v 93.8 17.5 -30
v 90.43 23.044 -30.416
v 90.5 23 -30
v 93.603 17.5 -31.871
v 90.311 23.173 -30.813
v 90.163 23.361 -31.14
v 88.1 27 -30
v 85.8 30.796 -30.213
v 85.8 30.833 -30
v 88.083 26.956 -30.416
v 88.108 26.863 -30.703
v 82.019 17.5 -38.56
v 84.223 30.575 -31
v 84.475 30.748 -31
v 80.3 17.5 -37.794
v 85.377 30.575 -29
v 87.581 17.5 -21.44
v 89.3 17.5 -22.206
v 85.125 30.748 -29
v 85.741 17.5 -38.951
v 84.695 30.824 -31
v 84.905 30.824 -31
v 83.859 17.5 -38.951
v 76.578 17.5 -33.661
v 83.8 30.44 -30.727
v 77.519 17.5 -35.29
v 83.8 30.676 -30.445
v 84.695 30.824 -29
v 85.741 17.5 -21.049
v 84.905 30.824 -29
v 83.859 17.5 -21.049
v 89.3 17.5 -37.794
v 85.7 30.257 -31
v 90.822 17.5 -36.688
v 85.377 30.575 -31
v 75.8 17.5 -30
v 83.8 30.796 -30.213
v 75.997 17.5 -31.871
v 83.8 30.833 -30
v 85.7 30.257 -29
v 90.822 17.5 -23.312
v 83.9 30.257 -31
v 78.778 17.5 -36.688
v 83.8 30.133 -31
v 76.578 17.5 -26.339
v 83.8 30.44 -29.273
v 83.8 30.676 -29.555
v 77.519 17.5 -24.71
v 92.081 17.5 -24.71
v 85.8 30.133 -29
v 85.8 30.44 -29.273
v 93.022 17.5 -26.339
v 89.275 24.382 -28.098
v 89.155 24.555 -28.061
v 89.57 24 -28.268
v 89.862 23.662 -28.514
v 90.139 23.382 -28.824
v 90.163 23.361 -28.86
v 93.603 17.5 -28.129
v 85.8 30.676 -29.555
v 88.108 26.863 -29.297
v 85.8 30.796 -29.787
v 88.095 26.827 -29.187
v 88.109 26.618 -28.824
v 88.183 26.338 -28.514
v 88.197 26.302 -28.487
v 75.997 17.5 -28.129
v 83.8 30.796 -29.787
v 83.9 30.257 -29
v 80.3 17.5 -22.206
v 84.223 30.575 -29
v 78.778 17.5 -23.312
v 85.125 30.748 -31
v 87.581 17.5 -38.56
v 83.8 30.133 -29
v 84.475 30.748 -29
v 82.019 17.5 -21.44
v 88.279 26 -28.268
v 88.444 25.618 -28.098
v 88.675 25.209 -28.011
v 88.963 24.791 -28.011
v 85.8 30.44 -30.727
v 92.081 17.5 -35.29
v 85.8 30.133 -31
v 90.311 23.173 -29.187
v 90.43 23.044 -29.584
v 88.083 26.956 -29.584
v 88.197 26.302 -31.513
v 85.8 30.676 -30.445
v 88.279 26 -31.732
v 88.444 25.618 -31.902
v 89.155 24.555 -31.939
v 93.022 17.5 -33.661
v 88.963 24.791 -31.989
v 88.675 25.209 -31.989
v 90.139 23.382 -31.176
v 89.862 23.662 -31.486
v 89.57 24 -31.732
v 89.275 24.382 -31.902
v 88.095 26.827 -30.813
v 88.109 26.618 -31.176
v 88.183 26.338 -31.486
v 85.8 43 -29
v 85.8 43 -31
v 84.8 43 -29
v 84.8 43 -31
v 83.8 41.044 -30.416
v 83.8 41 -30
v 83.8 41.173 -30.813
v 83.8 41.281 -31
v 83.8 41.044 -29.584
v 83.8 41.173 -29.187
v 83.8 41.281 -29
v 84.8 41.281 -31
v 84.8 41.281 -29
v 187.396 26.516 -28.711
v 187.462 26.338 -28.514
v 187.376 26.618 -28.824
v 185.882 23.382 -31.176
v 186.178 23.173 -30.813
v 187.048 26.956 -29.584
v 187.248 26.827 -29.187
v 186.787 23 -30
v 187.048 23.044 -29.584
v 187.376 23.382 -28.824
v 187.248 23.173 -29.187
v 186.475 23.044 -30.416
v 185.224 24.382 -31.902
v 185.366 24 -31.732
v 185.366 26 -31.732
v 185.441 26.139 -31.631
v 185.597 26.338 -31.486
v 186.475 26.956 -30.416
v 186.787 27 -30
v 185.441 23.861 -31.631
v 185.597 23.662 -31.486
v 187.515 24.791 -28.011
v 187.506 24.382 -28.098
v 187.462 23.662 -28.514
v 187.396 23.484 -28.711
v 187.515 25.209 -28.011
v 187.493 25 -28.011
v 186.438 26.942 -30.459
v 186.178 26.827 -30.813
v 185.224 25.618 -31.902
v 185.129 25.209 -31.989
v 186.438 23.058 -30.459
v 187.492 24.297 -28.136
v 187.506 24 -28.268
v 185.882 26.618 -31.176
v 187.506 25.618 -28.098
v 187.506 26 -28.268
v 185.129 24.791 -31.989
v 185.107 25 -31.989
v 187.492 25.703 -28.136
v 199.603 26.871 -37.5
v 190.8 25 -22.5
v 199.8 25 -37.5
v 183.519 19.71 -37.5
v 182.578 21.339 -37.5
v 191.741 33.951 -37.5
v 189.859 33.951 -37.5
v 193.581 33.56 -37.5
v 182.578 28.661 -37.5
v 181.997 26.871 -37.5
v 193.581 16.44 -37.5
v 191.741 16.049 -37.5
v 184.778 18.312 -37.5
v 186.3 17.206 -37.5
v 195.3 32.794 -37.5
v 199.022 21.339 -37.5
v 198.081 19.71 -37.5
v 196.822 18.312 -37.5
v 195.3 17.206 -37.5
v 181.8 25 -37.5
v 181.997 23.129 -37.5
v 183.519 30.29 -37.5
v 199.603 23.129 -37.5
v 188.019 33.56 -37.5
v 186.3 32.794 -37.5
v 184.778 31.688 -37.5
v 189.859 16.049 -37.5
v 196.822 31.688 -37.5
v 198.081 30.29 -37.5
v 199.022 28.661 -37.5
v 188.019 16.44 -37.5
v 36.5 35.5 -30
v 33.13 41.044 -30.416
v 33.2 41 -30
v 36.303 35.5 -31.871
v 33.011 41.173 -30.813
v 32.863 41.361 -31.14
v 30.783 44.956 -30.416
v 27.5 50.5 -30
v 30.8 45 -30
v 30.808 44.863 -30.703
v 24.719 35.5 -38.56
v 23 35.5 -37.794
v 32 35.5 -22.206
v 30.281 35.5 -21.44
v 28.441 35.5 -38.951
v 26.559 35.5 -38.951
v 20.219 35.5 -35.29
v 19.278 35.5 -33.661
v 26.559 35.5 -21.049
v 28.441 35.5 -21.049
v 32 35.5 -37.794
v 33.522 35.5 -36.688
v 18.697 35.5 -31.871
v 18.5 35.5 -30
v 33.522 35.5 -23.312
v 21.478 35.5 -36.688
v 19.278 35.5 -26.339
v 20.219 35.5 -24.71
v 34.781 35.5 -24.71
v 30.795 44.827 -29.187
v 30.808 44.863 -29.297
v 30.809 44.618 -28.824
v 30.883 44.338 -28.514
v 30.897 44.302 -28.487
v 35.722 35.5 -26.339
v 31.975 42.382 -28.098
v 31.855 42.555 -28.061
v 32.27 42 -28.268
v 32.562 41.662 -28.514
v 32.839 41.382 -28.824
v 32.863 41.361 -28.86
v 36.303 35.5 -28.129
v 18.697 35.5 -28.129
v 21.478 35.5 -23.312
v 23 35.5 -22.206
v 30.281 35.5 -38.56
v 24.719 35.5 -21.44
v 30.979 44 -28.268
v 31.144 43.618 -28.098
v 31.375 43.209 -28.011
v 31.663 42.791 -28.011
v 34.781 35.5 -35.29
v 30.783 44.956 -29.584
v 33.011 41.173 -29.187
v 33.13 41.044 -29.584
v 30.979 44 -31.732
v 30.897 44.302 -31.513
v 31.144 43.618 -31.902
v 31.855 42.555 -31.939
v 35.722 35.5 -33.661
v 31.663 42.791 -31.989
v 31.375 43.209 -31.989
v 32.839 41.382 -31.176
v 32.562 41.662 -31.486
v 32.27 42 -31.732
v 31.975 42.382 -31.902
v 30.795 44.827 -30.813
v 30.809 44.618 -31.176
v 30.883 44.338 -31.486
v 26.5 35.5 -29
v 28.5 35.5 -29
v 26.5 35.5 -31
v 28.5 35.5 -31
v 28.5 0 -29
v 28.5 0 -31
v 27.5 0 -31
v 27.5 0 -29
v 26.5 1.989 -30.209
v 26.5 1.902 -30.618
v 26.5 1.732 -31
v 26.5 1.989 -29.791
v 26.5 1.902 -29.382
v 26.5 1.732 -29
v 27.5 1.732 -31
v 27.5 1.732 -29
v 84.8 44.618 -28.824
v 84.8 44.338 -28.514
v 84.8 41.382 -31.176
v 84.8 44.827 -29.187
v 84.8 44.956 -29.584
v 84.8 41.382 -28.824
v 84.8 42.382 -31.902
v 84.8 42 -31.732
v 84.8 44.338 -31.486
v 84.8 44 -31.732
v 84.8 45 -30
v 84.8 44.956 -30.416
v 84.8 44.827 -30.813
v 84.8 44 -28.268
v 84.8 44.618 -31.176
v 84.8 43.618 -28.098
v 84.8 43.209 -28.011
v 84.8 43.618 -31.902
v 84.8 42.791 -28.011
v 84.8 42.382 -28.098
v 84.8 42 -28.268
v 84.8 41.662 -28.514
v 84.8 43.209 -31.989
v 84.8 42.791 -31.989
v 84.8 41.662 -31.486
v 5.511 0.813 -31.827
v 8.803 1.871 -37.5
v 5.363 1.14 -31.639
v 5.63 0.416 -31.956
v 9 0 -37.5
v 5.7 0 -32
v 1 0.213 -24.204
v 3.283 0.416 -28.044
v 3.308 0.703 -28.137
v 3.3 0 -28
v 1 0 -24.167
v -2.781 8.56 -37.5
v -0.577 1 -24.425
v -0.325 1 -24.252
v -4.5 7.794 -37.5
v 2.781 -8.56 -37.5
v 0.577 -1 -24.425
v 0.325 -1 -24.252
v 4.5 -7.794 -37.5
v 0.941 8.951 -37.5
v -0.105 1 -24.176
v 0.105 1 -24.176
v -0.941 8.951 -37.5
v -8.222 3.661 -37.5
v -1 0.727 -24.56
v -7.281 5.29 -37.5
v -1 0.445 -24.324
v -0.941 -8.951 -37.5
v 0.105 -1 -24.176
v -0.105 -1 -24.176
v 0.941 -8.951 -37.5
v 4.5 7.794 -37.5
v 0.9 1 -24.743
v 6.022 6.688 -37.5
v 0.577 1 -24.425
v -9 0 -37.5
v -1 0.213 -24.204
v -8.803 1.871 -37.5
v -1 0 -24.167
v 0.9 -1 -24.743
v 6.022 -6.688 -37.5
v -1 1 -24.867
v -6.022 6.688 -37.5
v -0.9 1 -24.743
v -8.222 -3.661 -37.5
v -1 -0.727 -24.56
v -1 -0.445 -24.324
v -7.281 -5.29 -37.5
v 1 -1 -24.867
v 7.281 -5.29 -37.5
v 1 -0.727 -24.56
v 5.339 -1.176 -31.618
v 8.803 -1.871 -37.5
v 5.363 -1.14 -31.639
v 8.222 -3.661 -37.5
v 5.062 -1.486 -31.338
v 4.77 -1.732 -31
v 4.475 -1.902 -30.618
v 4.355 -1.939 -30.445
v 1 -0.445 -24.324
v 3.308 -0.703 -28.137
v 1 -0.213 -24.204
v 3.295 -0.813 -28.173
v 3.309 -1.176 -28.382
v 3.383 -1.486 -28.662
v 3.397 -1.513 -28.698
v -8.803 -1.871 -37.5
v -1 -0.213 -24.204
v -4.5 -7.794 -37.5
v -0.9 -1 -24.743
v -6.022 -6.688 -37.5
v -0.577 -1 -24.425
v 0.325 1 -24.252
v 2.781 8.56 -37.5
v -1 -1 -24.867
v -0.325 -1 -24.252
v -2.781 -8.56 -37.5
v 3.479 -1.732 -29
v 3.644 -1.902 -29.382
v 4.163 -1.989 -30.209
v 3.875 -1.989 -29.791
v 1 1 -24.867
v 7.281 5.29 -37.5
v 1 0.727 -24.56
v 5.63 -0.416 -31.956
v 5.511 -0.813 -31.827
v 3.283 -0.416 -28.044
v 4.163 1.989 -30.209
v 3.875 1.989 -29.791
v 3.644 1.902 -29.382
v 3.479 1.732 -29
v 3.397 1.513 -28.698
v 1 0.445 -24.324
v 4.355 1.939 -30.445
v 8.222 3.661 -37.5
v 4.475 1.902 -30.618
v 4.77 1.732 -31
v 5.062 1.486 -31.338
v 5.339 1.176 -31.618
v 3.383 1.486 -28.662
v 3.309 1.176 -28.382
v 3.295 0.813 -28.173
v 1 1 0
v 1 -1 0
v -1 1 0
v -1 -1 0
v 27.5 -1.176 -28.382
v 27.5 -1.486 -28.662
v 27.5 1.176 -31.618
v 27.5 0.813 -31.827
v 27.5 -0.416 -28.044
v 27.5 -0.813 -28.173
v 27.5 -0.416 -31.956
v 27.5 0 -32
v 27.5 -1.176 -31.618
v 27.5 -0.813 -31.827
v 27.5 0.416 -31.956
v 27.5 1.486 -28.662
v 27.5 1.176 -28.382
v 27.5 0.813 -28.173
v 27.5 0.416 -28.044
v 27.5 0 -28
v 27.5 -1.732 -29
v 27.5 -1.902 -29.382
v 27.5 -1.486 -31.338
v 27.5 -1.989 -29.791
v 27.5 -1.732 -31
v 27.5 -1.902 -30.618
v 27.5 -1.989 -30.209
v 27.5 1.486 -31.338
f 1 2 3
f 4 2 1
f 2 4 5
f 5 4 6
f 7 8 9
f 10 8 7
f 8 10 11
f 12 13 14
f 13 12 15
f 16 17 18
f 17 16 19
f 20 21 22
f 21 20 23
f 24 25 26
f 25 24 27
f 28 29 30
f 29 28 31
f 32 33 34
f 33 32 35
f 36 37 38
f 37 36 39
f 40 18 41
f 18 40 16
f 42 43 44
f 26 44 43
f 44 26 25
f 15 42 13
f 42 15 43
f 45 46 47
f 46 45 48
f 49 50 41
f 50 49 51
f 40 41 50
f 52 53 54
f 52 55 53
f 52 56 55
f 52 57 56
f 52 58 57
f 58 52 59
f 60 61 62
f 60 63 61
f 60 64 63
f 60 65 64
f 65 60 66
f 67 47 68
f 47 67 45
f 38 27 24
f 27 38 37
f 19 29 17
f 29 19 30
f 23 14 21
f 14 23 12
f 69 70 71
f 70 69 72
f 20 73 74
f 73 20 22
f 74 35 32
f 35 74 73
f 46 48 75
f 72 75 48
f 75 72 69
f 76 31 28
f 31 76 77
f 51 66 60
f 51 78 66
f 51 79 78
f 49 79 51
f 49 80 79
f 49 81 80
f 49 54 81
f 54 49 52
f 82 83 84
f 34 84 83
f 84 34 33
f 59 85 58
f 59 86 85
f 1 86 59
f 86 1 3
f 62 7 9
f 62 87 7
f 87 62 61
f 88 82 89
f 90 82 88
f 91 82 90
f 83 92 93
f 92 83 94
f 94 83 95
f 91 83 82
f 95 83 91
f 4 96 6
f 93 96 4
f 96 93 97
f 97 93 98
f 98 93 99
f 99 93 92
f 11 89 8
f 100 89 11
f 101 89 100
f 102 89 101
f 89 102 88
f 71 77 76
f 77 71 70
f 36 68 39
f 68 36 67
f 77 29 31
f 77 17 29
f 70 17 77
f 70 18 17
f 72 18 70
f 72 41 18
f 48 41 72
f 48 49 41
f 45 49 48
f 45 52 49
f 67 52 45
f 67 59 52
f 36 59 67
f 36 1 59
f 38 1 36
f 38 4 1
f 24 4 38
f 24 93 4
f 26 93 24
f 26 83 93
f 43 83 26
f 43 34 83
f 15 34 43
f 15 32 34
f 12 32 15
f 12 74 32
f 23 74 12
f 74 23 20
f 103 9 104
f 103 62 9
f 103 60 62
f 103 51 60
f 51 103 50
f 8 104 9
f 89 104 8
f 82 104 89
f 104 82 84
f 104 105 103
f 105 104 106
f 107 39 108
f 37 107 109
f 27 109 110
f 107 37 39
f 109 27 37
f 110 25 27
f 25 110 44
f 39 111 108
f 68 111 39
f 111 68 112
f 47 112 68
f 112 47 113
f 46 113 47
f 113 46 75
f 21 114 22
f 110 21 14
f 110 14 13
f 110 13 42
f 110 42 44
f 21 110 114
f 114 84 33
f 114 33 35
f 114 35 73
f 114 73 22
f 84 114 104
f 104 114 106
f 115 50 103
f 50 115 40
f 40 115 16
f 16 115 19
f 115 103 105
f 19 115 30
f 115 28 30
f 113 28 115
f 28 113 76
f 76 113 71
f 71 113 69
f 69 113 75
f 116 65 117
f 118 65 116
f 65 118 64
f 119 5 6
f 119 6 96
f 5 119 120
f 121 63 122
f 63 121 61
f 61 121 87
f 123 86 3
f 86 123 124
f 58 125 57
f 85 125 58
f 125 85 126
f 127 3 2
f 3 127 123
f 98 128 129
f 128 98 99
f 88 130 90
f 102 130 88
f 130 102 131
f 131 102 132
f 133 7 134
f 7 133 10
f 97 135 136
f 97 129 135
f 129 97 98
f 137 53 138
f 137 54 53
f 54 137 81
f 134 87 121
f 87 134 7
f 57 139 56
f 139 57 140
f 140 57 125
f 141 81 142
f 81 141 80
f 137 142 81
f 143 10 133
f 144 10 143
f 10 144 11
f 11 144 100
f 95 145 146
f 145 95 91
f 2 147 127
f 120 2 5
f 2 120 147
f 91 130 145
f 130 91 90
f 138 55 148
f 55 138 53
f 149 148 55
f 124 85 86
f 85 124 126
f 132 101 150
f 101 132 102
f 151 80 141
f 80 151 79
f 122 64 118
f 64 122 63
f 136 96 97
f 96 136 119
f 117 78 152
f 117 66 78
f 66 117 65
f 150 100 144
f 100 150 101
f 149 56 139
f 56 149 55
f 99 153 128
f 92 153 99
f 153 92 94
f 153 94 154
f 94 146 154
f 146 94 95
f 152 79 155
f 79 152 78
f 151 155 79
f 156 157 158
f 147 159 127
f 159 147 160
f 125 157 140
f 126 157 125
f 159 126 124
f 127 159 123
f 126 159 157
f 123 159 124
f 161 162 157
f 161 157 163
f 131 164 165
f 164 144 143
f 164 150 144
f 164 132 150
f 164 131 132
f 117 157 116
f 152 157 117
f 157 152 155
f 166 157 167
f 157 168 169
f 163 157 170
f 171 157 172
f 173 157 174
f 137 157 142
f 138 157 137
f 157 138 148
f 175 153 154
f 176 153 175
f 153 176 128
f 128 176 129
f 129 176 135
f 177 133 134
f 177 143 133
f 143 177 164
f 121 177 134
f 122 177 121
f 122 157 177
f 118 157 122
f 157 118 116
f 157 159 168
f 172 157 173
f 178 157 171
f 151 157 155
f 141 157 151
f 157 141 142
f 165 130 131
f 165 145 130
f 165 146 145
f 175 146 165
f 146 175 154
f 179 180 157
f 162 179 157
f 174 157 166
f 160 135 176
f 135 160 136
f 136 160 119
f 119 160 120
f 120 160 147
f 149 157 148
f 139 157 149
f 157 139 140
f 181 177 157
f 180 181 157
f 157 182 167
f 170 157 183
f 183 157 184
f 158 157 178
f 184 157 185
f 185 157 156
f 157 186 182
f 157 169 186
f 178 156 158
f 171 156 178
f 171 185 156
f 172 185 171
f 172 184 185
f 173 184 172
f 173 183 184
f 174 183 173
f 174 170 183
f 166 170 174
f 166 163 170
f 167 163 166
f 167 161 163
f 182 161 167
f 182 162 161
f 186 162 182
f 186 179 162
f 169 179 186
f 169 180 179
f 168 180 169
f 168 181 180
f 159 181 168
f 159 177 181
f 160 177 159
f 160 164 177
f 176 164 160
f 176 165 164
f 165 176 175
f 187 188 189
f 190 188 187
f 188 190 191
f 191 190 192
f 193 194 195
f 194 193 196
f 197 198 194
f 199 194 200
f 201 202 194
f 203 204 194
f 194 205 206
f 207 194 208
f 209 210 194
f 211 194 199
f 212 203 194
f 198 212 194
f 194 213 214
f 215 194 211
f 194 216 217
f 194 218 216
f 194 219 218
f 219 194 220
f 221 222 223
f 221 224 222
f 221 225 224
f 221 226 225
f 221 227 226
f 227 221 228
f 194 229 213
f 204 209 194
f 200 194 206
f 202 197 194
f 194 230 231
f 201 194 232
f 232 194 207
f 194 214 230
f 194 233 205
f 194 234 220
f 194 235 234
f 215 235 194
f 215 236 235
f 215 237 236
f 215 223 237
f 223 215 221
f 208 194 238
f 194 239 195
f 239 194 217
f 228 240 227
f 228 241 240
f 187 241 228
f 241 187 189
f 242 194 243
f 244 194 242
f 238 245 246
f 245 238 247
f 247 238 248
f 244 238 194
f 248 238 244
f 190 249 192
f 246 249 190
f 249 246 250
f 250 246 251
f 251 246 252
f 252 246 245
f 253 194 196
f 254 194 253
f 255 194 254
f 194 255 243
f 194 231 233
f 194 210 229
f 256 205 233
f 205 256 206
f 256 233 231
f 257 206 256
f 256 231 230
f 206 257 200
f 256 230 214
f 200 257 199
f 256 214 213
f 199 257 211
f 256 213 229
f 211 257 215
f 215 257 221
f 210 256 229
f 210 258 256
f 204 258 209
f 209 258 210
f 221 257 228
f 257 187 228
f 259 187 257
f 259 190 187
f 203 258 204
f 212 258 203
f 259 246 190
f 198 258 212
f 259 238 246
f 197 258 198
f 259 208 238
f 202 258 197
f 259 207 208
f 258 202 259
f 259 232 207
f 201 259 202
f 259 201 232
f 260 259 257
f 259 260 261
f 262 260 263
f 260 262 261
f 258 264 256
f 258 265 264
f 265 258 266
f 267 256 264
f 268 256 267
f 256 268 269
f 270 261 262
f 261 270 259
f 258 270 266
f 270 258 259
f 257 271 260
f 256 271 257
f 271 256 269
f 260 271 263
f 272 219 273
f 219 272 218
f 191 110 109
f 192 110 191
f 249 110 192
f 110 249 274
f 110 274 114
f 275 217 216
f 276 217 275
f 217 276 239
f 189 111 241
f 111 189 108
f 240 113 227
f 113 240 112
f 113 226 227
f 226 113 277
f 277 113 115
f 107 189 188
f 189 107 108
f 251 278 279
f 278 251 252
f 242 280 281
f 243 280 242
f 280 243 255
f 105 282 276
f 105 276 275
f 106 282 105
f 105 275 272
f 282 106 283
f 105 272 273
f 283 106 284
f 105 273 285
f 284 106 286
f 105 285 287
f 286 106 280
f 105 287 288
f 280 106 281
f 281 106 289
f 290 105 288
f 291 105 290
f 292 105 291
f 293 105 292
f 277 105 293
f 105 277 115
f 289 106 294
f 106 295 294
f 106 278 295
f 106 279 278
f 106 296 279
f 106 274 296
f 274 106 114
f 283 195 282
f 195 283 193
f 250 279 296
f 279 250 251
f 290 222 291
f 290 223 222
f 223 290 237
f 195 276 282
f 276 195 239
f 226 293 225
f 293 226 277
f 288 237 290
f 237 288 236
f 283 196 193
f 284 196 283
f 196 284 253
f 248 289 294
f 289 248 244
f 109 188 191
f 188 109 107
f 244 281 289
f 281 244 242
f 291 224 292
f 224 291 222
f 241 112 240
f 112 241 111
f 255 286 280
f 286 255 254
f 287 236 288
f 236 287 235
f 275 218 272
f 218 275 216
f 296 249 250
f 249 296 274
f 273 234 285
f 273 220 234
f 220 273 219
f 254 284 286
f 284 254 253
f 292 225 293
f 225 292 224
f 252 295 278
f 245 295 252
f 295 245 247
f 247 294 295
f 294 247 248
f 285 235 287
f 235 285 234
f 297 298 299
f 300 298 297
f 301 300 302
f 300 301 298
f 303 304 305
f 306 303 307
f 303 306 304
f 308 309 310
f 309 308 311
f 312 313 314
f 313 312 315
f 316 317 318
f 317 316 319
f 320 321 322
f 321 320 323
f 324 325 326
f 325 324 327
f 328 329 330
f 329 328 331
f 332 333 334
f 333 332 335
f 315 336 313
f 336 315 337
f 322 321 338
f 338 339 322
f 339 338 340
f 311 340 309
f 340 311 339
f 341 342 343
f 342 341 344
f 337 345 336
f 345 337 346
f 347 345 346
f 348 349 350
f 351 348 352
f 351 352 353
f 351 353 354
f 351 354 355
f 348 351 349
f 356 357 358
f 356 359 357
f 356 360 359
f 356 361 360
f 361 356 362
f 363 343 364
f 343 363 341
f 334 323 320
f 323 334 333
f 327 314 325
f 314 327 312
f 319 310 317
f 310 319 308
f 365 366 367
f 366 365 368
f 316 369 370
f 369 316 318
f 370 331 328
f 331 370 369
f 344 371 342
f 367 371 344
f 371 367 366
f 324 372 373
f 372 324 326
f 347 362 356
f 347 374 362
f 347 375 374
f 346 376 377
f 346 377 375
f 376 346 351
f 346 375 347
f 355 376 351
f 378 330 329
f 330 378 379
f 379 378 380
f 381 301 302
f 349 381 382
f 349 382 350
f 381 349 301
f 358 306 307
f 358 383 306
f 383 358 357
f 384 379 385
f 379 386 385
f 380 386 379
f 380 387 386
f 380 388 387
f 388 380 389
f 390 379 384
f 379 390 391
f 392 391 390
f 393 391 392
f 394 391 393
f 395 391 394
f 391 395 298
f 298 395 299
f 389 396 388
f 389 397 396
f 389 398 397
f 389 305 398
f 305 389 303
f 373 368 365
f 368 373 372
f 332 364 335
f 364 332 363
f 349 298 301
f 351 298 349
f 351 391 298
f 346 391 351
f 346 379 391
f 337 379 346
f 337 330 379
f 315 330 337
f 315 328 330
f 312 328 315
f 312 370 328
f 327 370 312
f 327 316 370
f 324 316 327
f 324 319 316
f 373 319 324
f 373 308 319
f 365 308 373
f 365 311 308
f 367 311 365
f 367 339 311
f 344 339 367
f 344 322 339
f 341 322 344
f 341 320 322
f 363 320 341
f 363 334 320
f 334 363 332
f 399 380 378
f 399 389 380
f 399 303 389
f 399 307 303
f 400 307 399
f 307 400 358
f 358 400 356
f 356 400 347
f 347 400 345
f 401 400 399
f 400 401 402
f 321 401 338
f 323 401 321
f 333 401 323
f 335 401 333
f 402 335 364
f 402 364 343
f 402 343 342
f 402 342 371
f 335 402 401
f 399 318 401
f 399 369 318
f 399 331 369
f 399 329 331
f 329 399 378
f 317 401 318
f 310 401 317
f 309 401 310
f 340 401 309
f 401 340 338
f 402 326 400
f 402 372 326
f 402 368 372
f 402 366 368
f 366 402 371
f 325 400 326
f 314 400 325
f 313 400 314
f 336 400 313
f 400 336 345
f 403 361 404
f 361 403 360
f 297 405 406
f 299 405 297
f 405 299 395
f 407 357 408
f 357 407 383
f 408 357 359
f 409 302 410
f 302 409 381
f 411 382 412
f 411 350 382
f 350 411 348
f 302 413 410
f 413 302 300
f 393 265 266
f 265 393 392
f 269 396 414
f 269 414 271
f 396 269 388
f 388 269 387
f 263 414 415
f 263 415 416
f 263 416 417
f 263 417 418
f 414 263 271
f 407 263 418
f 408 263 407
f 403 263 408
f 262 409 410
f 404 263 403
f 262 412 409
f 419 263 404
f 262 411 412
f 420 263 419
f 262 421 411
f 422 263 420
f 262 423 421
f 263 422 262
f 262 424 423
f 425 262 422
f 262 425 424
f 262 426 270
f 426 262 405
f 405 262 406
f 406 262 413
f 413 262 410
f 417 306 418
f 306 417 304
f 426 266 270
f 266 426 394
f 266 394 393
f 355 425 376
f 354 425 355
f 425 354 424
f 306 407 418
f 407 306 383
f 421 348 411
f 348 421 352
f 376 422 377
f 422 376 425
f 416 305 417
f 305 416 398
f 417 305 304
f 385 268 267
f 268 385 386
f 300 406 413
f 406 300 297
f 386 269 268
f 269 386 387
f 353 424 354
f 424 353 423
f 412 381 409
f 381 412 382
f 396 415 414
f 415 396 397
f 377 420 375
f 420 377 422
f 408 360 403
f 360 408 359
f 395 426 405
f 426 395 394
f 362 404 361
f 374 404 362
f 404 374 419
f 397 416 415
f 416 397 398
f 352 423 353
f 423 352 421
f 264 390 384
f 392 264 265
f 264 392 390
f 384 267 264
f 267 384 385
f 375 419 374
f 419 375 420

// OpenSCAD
// file: quad_manipulator.scad
dh_cone1();

module dh_cone1() {
    rotate([alpha1, 0, 0])
    translate([a1, 0, 0])
    rotate([0, 0, theta1])
    translate([0, 0, d1]) {
        color([231/255, 88/255, 88/255]) cylinder(r1=jr, r2=0, h=jh, center=true, $fn=resolution); // joint
        color ([70/255, 70/255, 70/255]) translate([0, 0, -d1/2]) cube ([ow, ow, abs(d1)], center=true); // offset
        rotate ([0, 90, 0]) cylinder (r=2, h=a2, $fn = resolution); // link

        dh_cone2();
    }
}
module dh_cone2() {
    rotate([alpha2, 0, 0])
    translate([a2, 0, 0])
    rotate([0, 0, theta2])
    translate([0, 0, d2]) {
        color([231/255, 88/255, 88/255]) cylinder(r1=jr, r2=0, h=jh, center=true, $fn=resolution); // joint
        color ([70/255, 70/255, 70/255]) translate([0, 0, -d2/2]) cube ([ow, ow, abs(d2)], center=true); // offset
        rotate ([0, 90, 0]) cylinder (r=2, h=a3, $fn = resolution); // link

        dh_cone3();
    }
}
module dh_cone3() {
    rotate([alpha3, 0, 0])
    translate([a3, 0, 0])
    rotate([0, 0, theta3])
    translate([0, 0, d3]) {
        color([231/255, 88/255, 88/255]) cylinder(r1=jr, r2=0, h=jh, center=true, $fn=resolution); // joint
        color ([70/255, 70/255, 70/255]) translate([0, 0, -d3/2]) cube ([ow, ow, abs(d3)], center=true); // offset
        rotate ([0, 90, 0]) cylinder (r=2, h=a4, $fn = resolution); // link

        dh_cone4();
    }
}
module dh_cone4() {
    rotate([alpha4, 0, 0])
    translate([a4, 0, 0])
    rotate([0, 0, theta4])
    translate([0, 0, d4]) {
        color([231/255, 88/255, 88/255]) cylinder(r1=jr, r2=0, h=jh, center=true, $fn=resolution); // joint
        color ([70/255, 70/255, 70/255]) translate([0, 0, -d4/2]) cube ([ow, ow, abs(d4)], center=true); // offset
    }
}
// file: quad_params.scad
resolution = 30;

jr = 9;
jh = 15;
ow = 2;

alpha1 = 0;
a1     = 0;
d1     = -30;

alpha2 = -90;
a2     = 27.5;
d2     = 43;

alpha3 = 0;
a3     = 57.3;
d3     = -18;

alpha4 = 90;
a4     = 106;
d4     = 0;
// main file
include <quad_params.scad>;

// IK CALCULATION
x = 190.8;
y = 25;
z = -30;


theta1_ik1 = atan2(-x, y) + atan2(sqrt(x*x + y*y - pow(d3 + d2, 2)), d3 + d2);
theta1_ik2 = atan2(-x, y) - atan2(sqrt(x*x + y*y - pow(d3 + d2, 2)), d3 + d2);
theta1_ik = round(theta1_ik1*10) / 10;

ik_a = -4*a2*x*cos(theta1_ik) - 4*a2*y*sin(theta1_ik) + x*x*cos(2*theta1_ik) + 2*x*y*sin(2*theta1_ik) - y*y*cos(2*theta1_ik) + 2*pow(z - d1, 2) + 2*a2*a2 + x*x + y*y;
ik_b1 = (ik_a/2 - a3*a3 - a4*a4) / (2*a3*a4);
ik_b = round(ik_b1*1000000) / 1000000; // round to six places
theta3_ik1 = atan2(sqrt(1 - ik_b*ik_b), ik_b);
theta3_ik2 = atan2(-sqrt(1 - ik_b*ik_b), ik_b);
theta3_ik = round(theta3_ik1*10) / 10;

ik_c = a2 - (x*cos(theta1_ik) + y*sin(theta1_ik));
ik_d = -z + d1;
ik_e = a4*sin(theta3_ik);
theta2_ik1 = atan2(ik_c, ik_d) + atan2(sqrt(ik_c*ik_c + ik_d*ik_d - ik_e*ik_e), ik_e);
theta2_ik2 = atan2(ik_c, ik_d) - atan2(sqrt(ik_c*ik_c + ik_d*ik_d - ik_e*ik_e), ik_e);
theta2_ik = round(theta2_ik1*10) / 10;


echo("theta1, solution 1", theta1_ik1 - 360);
echo("theta1, solution 2", theta1_ik2 - 360);

echo("theta2, solution 1", theta2_ik1 - 360);
echo("theta2, solution 2", theta2_ik2 - 360);

echo("theta3, solution 1", theta3_ik1);
echo("theta3, solution 2", theta3_ik2);

echo();


// RENDER THE MANIPULATOR

theta1 = theta1_ik;
theta2 = theta2_ik;
theta3 = theta3_ik;
theta4 = 0;

include <quad_manipulator.scad>;
